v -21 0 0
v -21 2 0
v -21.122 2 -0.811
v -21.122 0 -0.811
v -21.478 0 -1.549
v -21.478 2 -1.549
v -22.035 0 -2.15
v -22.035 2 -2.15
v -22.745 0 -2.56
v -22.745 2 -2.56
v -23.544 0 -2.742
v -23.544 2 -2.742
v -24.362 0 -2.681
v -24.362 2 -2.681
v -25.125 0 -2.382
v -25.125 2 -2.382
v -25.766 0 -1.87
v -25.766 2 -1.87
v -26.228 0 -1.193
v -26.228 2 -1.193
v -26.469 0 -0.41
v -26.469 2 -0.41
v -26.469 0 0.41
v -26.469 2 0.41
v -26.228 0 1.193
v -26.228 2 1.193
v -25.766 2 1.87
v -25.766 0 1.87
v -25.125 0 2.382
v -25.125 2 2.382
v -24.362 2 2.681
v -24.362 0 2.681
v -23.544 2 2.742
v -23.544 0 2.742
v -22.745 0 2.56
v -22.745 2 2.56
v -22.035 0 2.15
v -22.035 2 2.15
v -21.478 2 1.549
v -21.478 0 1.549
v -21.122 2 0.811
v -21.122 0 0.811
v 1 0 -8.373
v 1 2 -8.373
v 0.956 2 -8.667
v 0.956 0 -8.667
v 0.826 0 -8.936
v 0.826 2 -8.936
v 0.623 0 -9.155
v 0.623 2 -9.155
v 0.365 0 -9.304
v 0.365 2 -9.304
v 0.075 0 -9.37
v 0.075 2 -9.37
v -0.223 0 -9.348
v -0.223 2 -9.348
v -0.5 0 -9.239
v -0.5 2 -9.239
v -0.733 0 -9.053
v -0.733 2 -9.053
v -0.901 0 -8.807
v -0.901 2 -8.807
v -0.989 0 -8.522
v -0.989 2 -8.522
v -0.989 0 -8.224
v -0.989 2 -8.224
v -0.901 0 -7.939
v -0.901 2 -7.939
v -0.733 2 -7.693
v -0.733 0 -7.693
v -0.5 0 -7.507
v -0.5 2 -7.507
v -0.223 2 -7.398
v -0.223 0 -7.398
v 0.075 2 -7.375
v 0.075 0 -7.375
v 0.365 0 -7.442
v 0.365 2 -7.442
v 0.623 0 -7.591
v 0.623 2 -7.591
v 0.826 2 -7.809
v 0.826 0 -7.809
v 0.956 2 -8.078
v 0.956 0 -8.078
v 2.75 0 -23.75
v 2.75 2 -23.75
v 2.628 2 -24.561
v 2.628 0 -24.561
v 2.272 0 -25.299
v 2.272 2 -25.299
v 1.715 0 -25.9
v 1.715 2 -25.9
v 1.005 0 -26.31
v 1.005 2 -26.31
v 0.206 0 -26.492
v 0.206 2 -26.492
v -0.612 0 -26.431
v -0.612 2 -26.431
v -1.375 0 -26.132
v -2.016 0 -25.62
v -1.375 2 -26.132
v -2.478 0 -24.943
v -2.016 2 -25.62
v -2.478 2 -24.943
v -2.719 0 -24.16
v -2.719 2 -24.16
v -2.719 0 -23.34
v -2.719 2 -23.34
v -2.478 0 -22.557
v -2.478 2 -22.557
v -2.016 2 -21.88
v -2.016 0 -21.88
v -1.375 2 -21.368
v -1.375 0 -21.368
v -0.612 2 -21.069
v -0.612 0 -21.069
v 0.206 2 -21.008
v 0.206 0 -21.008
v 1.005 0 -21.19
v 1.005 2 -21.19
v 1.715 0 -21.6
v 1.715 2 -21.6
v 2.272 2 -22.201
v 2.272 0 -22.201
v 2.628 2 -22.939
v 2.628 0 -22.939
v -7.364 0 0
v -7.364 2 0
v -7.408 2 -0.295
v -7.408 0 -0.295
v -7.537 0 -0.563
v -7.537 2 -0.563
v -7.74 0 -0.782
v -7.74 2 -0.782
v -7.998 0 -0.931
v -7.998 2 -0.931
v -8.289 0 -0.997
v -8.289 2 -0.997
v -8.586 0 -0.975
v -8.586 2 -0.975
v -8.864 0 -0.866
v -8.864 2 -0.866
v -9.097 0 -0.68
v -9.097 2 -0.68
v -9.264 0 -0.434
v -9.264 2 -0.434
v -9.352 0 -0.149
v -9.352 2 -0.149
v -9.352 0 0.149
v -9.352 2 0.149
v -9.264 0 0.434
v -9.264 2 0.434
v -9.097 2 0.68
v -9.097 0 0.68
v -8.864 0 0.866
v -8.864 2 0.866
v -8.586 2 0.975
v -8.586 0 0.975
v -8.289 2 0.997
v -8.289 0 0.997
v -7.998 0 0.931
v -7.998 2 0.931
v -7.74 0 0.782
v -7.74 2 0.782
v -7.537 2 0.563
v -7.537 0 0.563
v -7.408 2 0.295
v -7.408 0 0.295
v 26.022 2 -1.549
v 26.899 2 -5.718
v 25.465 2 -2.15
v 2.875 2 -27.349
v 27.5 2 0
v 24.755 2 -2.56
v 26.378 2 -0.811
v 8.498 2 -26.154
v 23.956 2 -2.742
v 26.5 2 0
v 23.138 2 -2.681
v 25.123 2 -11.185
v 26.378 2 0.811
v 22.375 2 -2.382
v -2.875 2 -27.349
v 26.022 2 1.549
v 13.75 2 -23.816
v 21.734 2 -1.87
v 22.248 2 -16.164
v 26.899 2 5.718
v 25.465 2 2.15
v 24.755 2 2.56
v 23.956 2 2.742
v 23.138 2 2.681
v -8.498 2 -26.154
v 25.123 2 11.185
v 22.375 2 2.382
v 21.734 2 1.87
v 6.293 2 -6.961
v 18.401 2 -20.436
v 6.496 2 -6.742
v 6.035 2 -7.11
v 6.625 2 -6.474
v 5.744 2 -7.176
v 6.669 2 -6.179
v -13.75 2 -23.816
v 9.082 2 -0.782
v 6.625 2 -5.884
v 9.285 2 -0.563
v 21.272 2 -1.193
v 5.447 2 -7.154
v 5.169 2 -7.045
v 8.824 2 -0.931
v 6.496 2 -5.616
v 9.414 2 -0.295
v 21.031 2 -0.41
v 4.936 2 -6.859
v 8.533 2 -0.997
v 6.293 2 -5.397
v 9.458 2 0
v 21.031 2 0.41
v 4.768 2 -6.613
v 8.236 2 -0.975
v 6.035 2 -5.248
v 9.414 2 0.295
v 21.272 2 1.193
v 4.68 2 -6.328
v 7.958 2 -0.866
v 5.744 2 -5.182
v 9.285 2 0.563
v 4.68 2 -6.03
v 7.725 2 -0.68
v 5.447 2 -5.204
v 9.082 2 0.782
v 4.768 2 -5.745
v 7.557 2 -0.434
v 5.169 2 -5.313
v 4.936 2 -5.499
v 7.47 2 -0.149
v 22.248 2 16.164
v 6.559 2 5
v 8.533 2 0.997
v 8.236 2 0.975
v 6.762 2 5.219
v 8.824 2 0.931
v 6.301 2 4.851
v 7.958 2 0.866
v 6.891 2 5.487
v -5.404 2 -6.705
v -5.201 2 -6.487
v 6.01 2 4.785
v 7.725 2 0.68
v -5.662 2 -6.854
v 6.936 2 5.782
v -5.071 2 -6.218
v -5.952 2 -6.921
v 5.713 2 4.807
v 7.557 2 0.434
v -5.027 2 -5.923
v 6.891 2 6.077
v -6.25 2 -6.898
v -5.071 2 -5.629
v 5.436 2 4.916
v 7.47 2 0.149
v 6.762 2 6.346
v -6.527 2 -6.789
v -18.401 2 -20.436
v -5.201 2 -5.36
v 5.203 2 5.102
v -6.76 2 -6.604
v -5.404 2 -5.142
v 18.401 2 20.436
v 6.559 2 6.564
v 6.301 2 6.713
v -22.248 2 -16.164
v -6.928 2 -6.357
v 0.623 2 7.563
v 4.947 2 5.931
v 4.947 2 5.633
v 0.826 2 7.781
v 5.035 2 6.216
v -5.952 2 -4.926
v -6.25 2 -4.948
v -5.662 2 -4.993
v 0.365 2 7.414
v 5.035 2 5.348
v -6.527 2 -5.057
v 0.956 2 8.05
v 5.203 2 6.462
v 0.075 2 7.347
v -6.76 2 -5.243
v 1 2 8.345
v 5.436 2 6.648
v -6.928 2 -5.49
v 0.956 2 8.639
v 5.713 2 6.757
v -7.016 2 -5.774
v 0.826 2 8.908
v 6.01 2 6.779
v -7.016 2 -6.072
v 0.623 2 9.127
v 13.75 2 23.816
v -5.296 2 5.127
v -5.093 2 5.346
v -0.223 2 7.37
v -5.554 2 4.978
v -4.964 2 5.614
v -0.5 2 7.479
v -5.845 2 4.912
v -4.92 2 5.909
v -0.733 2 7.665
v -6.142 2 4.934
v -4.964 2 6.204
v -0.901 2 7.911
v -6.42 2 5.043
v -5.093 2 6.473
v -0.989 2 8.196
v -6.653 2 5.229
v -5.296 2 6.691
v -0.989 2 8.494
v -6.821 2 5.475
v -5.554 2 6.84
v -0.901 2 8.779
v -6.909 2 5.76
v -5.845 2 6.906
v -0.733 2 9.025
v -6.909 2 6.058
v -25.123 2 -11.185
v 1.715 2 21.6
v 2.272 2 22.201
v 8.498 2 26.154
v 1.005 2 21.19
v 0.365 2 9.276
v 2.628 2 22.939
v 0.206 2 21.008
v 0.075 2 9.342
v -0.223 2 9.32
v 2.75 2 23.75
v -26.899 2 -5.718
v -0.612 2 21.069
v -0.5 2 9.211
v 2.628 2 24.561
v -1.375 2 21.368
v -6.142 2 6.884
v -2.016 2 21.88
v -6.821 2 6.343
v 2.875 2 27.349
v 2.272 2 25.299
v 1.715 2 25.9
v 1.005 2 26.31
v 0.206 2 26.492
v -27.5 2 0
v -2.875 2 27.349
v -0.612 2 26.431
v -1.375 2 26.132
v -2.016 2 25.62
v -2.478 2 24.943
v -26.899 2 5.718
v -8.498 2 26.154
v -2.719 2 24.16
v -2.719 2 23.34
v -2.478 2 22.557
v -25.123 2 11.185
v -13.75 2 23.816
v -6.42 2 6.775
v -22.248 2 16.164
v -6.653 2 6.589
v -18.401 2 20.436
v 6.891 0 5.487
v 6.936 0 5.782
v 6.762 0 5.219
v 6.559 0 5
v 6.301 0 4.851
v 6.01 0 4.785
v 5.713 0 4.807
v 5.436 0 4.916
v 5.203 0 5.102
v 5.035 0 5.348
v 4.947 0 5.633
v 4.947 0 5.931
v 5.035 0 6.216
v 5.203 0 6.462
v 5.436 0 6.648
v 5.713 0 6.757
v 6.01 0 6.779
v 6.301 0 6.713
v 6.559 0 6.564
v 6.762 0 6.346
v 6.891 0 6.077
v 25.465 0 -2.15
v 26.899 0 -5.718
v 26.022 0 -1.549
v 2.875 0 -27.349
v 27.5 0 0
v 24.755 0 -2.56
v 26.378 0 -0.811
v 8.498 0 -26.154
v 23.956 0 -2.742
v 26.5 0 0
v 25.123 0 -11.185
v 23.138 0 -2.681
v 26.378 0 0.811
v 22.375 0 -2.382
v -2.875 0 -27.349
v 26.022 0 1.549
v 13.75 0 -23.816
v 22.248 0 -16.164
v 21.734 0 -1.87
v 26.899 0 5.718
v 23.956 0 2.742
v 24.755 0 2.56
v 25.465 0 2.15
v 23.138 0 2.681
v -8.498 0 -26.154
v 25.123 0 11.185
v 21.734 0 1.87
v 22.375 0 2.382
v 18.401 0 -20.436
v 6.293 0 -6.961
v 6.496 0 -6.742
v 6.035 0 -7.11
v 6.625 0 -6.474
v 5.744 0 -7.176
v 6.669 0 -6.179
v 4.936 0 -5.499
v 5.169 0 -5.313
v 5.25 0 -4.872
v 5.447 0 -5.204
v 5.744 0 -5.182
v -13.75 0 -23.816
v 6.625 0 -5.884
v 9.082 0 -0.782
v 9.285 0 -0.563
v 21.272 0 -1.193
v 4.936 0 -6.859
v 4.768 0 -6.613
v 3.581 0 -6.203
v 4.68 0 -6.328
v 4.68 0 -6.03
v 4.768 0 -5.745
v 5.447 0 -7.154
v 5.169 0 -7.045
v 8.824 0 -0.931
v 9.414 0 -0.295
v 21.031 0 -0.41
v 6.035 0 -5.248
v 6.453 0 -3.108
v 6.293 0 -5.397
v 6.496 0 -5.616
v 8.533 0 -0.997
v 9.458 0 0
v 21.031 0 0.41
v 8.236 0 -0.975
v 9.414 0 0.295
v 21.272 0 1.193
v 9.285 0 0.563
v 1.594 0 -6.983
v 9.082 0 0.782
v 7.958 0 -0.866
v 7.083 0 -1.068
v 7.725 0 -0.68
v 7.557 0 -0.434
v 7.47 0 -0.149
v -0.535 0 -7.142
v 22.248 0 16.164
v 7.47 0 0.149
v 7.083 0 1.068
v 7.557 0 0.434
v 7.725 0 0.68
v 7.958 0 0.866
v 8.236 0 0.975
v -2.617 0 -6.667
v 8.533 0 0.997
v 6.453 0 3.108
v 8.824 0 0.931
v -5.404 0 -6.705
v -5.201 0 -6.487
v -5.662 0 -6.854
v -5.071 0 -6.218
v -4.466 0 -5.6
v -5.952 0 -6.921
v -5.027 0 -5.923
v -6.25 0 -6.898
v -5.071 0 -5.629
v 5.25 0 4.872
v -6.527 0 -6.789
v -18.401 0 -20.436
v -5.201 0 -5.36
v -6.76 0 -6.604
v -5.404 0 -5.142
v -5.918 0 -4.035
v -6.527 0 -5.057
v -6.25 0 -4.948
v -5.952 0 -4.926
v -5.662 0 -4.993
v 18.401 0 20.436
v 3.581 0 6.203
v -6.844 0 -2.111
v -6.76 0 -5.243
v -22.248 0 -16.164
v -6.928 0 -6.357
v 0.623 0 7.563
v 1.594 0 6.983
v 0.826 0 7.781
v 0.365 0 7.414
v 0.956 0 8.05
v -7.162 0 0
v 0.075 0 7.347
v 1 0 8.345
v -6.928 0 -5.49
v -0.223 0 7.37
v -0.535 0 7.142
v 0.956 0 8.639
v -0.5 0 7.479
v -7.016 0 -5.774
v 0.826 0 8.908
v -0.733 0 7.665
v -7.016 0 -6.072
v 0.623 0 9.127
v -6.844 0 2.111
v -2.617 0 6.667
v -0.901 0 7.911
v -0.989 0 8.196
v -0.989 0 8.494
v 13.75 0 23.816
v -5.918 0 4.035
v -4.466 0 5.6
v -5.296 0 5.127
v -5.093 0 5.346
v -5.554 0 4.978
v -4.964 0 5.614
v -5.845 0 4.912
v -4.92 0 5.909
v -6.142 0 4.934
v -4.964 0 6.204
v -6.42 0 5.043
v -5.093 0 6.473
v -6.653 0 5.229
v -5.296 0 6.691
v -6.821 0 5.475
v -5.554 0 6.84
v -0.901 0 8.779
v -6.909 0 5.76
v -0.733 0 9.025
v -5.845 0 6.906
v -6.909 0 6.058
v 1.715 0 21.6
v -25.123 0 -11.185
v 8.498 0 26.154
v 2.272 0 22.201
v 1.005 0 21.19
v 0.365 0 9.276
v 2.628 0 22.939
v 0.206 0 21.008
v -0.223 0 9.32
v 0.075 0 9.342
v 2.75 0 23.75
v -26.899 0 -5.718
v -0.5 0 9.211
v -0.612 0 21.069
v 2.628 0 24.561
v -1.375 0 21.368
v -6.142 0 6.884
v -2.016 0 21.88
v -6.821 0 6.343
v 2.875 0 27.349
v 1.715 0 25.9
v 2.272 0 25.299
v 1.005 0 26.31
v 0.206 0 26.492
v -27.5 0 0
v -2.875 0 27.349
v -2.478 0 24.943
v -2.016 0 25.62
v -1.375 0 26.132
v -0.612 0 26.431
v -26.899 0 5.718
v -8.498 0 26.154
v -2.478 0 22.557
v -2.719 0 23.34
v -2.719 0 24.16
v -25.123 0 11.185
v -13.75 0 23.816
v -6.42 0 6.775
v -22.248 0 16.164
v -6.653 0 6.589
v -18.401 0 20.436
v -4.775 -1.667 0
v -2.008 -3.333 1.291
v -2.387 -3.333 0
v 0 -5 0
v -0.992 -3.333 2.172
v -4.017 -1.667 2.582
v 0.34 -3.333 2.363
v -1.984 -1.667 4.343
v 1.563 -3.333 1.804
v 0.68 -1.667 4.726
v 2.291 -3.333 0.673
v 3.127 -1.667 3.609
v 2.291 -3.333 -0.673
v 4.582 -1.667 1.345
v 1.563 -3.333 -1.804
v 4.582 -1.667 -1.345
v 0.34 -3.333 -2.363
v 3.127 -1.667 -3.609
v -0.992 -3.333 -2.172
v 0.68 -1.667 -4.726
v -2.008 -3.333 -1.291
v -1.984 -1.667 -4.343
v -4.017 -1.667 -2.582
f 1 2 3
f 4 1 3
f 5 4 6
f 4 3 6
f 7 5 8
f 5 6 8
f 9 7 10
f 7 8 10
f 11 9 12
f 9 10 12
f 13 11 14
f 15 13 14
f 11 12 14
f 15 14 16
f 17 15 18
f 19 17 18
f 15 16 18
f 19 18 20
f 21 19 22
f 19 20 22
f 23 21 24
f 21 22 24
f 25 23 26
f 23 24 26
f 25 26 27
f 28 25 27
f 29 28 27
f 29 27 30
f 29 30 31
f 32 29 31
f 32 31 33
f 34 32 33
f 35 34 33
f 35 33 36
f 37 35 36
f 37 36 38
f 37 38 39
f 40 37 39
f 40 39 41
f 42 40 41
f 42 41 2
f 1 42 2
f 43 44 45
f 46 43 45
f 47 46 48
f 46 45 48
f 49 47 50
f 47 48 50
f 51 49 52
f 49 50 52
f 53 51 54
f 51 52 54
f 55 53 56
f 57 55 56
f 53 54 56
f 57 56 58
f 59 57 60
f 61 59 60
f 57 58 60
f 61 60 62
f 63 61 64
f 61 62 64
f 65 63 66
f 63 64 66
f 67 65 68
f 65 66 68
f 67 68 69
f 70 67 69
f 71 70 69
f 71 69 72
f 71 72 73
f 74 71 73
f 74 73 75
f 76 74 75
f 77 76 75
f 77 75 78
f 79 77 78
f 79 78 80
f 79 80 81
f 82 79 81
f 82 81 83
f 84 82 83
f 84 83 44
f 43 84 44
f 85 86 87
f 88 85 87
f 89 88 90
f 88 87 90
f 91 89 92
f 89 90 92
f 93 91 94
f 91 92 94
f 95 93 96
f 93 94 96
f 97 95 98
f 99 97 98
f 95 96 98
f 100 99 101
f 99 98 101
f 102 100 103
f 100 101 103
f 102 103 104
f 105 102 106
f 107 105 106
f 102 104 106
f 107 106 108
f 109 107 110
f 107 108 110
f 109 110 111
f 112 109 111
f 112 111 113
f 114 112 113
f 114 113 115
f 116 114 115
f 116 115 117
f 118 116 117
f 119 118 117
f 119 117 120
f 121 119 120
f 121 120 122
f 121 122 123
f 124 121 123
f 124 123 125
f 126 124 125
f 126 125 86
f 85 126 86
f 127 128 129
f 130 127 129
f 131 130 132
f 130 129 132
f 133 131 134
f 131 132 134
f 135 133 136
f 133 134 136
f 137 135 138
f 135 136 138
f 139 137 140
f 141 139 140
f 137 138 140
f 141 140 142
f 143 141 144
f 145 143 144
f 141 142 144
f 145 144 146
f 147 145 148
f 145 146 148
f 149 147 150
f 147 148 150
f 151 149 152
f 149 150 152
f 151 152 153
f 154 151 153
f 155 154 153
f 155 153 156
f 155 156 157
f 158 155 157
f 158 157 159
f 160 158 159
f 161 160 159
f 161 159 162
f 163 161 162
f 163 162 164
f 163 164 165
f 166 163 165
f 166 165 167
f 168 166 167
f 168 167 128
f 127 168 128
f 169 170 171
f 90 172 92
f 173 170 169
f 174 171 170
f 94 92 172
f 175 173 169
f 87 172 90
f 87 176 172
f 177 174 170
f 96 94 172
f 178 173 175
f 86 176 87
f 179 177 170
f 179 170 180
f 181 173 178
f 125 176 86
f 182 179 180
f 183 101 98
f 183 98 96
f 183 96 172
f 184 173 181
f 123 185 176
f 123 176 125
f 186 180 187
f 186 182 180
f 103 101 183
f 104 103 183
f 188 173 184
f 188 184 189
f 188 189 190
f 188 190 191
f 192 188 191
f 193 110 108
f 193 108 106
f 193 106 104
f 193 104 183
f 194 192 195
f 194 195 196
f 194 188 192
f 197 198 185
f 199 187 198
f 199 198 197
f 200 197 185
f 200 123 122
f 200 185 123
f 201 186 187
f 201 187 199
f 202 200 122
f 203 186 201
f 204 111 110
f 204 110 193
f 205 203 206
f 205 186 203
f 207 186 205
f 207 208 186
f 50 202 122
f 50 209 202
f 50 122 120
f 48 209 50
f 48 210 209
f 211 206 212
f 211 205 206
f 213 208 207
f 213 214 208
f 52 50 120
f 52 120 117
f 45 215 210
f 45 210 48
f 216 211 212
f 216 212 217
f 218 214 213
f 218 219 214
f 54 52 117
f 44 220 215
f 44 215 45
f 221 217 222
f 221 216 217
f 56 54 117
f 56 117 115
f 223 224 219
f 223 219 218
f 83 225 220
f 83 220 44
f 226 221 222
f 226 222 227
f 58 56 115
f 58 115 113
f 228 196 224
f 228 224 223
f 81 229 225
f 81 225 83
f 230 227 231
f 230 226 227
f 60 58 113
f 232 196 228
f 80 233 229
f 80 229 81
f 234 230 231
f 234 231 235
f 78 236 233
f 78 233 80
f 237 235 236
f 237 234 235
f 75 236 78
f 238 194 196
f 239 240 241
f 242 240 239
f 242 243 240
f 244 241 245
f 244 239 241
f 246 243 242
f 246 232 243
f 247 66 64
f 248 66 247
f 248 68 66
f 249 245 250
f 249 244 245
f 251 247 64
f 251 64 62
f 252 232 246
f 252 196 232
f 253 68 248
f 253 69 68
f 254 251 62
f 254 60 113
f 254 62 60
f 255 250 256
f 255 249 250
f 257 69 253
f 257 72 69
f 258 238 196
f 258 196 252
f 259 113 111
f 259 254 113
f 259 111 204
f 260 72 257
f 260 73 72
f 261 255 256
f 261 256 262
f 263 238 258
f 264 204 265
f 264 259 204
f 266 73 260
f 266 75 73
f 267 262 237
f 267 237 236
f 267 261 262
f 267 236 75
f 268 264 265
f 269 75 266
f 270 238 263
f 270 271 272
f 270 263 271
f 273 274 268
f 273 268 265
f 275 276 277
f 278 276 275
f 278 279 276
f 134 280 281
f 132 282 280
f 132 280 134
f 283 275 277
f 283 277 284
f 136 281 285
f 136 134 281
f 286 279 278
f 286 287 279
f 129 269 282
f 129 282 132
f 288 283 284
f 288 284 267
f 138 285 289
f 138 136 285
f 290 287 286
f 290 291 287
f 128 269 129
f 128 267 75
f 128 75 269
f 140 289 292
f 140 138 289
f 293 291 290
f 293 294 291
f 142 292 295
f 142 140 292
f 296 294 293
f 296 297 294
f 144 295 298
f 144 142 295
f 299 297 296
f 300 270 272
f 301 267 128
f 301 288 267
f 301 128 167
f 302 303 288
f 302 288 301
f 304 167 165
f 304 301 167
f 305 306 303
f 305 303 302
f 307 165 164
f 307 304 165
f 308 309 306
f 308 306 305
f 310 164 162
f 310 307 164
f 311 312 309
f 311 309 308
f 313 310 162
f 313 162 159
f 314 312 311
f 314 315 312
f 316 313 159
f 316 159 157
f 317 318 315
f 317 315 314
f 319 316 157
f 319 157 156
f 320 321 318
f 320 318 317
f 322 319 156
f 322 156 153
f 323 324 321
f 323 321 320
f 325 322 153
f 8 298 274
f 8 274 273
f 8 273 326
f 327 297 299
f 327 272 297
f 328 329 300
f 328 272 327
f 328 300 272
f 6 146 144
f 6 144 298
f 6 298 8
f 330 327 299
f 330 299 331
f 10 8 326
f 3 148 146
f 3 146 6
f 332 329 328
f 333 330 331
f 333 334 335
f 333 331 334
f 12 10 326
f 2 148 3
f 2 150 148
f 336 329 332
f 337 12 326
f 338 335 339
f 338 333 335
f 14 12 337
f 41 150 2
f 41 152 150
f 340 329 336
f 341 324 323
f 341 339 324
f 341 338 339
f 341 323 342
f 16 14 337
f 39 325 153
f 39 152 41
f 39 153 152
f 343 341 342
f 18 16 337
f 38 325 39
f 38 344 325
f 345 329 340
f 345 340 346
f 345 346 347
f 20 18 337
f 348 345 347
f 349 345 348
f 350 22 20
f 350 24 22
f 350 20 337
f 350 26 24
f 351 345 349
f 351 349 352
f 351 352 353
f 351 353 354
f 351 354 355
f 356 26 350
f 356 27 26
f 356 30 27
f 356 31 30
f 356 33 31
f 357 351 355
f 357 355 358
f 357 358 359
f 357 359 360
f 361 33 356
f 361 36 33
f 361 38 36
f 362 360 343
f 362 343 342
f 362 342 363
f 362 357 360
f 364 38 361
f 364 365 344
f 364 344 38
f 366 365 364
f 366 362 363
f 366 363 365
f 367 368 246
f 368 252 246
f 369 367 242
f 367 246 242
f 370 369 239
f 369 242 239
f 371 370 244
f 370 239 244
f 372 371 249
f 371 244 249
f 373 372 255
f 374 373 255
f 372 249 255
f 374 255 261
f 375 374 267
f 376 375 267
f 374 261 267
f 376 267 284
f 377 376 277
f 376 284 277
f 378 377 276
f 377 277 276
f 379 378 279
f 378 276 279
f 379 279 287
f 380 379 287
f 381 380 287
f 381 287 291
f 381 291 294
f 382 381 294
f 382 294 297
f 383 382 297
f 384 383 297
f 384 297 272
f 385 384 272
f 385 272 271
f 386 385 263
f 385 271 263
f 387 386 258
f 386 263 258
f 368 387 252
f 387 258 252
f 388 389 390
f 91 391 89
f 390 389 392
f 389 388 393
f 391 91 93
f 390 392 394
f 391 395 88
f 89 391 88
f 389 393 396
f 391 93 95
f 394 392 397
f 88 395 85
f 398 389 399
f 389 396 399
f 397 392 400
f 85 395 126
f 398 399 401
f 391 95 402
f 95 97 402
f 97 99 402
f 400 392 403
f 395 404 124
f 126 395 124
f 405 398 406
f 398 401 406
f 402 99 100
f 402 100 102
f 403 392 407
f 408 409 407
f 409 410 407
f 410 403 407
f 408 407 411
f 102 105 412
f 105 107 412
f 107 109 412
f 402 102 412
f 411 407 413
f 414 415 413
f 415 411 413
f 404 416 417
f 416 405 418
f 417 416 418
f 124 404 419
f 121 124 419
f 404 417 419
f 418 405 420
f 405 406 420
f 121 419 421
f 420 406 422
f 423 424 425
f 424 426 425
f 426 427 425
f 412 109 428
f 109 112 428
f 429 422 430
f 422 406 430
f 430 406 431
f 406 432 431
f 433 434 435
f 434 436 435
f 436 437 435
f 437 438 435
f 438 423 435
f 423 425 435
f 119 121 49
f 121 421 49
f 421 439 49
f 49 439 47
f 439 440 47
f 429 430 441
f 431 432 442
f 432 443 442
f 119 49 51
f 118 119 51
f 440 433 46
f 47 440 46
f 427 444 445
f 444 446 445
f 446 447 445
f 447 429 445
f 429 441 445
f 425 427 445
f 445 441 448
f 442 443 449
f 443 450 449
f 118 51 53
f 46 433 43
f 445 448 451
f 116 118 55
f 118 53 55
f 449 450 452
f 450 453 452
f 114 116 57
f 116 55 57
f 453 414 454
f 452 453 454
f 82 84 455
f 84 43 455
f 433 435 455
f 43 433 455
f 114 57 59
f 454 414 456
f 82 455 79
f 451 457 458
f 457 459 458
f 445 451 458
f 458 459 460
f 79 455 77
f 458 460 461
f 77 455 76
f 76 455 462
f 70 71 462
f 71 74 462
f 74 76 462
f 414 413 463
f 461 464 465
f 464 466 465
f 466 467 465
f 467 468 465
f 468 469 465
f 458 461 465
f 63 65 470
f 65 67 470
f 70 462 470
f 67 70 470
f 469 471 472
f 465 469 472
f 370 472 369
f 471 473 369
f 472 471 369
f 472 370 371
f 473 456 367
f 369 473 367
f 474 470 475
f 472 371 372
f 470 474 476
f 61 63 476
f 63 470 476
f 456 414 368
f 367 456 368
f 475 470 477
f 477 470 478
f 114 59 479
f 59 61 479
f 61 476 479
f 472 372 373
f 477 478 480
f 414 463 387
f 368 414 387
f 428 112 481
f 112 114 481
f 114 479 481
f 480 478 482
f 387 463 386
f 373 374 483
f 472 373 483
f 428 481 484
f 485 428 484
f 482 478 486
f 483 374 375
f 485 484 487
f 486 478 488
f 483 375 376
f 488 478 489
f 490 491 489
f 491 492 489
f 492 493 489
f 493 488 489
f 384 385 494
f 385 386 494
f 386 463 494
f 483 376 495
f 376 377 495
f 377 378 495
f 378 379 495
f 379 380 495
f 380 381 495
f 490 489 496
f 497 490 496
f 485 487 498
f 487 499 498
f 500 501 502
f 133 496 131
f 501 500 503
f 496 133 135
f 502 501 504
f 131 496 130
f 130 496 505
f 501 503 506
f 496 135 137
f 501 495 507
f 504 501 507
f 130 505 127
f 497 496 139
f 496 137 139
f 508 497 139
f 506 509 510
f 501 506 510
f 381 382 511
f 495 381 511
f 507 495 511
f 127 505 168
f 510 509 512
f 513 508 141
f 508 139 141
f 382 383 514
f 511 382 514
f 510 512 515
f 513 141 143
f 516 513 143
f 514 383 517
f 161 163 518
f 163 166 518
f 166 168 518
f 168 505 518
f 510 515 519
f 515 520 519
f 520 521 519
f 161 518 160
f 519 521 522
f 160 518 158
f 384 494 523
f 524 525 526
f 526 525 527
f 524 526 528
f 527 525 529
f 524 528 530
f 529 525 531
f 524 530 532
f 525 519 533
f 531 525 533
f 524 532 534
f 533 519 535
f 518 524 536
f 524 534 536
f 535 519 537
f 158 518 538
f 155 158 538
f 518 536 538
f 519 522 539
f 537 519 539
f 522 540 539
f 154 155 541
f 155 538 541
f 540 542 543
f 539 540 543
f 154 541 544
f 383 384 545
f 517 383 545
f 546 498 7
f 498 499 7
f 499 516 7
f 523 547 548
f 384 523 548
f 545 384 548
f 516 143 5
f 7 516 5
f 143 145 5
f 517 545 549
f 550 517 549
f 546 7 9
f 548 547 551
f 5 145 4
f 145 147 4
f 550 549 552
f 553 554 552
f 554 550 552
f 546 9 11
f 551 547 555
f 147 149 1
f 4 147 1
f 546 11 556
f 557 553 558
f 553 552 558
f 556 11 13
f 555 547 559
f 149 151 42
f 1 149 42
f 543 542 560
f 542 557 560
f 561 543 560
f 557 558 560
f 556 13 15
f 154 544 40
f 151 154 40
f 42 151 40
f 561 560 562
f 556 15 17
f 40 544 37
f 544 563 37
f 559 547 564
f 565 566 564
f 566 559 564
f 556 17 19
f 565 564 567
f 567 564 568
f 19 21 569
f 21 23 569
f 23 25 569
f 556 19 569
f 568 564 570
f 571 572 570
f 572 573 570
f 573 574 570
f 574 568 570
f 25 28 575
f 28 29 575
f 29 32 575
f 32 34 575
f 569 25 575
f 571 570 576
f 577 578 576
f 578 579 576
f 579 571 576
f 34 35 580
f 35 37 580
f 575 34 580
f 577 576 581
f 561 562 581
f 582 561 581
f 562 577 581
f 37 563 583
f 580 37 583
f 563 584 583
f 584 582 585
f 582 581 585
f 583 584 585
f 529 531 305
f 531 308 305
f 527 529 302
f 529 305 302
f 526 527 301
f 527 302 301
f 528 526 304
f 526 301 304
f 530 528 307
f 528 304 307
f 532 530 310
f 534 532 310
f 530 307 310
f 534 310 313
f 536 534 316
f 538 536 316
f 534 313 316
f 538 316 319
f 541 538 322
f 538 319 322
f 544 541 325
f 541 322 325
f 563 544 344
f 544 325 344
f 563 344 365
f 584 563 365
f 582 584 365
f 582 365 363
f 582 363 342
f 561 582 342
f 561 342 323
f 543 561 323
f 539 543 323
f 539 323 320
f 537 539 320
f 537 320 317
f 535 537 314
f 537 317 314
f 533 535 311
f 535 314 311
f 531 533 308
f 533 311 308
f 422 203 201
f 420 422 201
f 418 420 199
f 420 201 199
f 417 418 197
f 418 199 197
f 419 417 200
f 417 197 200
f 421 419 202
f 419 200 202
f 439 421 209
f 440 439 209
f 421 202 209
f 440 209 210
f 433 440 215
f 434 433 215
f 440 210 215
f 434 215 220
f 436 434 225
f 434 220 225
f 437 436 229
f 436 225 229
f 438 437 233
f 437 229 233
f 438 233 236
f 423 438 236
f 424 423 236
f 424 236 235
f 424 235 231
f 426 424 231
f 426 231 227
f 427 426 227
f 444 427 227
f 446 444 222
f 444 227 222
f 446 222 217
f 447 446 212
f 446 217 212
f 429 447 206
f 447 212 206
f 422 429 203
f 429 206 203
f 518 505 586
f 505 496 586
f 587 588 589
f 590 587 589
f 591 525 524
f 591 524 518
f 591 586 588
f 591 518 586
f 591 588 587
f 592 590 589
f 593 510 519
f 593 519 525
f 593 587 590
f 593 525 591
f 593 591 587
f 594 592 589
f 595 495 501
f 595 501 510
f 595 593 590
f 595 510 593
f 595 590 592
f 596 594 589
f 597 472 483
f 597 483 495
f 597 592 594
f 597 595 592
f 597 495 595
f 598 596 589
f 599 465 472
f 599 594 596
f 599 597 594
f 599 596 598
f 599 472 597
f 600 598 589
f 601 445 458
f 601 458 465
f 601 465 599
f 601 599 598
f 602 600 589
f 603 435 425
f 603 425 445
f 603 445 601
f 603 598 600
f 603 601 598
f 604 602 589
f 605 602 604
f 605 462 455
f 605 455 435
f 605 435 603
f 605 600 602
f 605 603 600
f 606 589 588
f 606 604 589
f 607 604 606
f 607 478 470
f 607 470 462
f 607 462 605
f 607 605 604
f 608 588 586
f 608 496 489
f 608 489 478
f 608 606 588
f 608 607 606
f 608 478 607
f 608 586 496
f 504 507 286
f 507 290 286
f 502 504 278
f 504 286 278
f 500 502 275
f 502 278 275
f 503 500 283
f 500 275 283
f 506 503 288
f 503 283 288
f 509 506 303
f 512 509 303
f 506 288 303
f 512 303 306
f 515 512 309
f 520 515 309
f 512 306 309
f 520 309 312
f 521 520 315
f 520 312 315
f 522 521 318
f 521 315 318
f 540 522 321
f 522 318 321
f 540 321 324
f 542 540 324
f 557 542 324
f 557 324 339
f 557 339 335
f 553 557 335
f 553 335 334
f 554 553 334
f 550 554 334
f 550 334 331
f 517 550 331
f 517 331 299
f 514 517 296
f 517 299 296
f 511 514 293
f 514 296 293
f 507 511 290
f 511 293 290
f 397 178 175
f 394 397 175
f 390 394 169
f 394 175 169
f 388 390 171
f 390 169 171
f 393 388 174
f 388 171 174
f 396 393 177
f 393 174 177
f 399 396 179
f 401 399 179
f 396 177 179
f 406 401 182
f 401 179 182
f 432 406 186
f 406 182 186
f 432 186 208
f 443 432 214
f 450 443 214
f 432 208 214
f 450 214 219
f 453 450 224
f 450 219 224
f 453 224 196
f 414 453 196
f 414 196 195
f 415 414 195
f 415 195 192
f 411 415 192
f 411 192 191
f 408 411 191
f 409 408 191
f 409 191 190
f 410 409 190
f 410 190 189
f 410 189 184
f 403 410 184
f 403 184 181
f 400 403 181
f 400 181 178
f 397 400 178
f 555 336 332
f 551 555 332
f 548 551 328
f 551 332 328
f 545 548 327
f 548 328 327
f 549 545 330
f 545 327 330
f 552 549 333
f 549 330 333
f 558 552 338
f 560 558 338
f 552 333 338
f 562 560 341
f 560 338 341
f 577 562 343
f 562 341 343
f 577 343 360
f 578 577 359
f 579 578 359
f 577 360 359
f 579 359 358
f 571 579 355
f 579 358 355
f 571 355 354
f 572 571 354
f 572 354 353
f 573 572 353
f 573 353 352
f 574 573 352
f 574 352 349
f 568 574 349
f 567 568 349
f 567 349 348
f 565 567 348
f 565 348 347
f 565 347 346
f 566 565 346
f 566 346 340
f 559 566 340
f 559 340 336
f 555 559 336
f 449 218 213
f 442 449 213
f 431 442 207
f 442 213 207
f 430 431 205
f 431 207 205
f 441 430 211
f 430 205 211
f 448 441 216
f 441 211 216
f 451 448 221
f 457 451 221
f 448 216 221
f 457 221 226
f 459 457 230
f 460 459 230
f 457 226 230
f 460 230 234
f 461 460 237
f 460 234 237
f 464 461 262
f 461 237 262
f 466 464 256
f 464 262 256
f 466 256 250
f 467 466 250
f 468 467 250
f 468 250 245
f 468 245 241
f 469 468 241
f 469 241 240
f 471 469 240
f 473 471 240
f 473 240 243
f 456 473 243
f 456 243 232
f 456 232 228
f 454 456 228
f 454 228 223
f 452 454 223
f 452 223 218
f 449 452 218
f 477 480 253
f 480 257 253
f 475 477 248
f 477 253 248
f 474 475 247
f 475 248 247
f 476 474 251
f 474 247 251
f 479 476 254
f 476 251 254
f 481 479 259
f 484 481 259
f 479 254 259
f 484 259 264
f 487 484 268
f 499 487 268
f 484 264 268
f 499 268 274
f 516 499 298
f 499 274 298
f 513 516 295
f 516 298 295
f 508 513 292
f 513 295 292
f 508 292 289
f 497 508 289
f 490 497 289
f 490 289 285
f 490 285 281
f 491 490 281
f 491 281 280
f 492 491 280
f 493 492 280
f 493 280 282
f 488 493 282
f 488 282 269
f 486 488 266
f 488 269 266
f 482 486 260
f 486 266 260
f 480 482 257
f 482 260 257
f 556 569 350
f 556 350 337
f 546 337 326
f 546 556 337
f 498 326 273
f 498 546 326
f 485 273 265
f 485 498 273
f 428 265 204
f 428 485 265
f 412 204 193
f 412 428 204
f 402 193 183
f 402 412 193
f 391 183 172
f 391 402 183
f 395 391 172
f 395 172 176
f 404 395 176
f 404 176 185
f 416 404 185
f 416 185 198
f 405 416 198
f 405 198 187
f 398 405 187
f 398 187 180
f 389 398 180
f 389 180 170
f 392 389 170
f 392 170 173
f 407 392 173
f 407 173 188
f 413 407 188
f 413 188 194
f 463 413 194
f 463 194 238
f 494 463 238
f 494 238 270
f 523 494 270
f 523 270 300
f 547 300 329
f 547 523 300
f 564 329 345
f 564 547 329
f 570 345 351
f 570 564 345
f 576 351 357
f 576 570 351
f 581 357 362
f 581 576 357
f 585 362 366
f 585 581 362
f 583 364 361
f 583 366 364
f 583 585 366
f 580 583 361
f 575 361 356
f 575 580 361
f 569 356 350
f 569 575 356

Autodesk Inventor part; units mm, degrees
ref_plane "YZ Plane" through (0, 0, 0) normal (1, 0, 0) x (0, 1, 0)
ref_plane "XZ Plane" through (0, 0, 0) normal (0, 1, 0) x (-1, 0, 0)
ref_plane "XY Plane" through (0, 0, 0) normal (0, 0, 1) x (1, 0, 0)
sketch "Boceto1" plane through (0, 0, 0) normal (0, 1, 0) x (-1, 0, 0)
  circle A0 centre (0, 0) radius 27.5
  dimension "d0" = 55
extrude "Extrusión1" add sketch "Boceto1" along normal blind 2
sketch "Boceto6" plane through (0, 2, 0) normal (0, 1, 0) x (1, 0, 0)
  circle A0 centre (0, 0) radius 9.6625
  circle A1 centre (-8.777, -8.777) radius 2.75 projected
  circle A2 centre (0, 0) radius 7.1625
  circle A3 centre (8.4584, 0) radius 1
  circle A4 centre (0, -8.3447) radius 1
  circle A5 centre (0, 8.3727) radius 1
  circle A6 centre (-8.3635, 0) radius 1
  circle A7 centre (5.9357, -5.7822) radius 1
  circle A8 centre (-6.027, 5.9234) radius 1
  circle A9 centre (5.6693, 6.1791) radius 1
  circle A10 centre (-5.9197, -5.9092) radius 1
  dimension "d32" = 14.325
  dimension "d33" = 2
  dimension "d34" = 2
  dimension "d35" = 2
  dimension "d36" = 2
  dimension "d37" = 2
  dimension "d38" = 2
  dimension "d39" = 2
  dimension "d40" = 2
extrude "Extrusión3" cut sketch "Boceto6" against normal blind 50 contours A3 | A4 | A5 | A6 | A7 | A8 | A9 | A10
sketch "Boceto7" plane through (0, 0, 0) normal (0, 0, 1) x (1, 0, 0)
  line L0 (0, 0) -> (-7.1625, 0)
  line L1 (-11.527, 0) -> (-11.527, 2) projected
  line L2 (0, 0) -> (0, -5)
  line L3 (0, -5) -> (-7.1625, 0)
  dimension "d43" = 7.1625
  dimension "d44" = 5
revolve "Revolución2" add sketch "Boceto7" angle 360 about axis through (0, 0, 0) along (0, -1, 0)
sketch "Boceto8" plane through (0, 2, 0) normal (0, 1, 0) x (1, 0, 0)
  circle A0 centre (0, 0) radius 7.1625 projected
  line L0 (0, 0) -> (0, 23.75)
  line L1 (0, 0) -> (23.75, 0)
  line L2 (0, 0) -> (0, -23.75)
  line L3 (0, 0) -> (-23.75, 0)
  circle A1 centre (-23.75, 0) radius 2.75
  circle A2 centre (0, 23.75) radius 2.75
  circle A3 centre (23.75, 0) radius 2.75
  circle A4 centre (0, -23.75) radius 2.75
  point P0 (0, 0)
  dimension "d57" = 23.75
  dimension "d58" = 23.75
  dimension "d59" = 23.75
  dimension "d60" = 23.75
  dimension "d61" = 5.5
  dimension "d62" = 5.5
  dimension "d63" = 5.5
  dimension "d64" = 5.5
extrude "Extrusión4" cut sketch "Boceto8" against normal blind 2 contours A4 | A1 | A2 | A3
sketch "Boceto10" plane through (0, 2, 0) normal (0, 1, 0) x (1, 0, 0)
  point P0 (0, 0)
properties part number "placa para pellet"
